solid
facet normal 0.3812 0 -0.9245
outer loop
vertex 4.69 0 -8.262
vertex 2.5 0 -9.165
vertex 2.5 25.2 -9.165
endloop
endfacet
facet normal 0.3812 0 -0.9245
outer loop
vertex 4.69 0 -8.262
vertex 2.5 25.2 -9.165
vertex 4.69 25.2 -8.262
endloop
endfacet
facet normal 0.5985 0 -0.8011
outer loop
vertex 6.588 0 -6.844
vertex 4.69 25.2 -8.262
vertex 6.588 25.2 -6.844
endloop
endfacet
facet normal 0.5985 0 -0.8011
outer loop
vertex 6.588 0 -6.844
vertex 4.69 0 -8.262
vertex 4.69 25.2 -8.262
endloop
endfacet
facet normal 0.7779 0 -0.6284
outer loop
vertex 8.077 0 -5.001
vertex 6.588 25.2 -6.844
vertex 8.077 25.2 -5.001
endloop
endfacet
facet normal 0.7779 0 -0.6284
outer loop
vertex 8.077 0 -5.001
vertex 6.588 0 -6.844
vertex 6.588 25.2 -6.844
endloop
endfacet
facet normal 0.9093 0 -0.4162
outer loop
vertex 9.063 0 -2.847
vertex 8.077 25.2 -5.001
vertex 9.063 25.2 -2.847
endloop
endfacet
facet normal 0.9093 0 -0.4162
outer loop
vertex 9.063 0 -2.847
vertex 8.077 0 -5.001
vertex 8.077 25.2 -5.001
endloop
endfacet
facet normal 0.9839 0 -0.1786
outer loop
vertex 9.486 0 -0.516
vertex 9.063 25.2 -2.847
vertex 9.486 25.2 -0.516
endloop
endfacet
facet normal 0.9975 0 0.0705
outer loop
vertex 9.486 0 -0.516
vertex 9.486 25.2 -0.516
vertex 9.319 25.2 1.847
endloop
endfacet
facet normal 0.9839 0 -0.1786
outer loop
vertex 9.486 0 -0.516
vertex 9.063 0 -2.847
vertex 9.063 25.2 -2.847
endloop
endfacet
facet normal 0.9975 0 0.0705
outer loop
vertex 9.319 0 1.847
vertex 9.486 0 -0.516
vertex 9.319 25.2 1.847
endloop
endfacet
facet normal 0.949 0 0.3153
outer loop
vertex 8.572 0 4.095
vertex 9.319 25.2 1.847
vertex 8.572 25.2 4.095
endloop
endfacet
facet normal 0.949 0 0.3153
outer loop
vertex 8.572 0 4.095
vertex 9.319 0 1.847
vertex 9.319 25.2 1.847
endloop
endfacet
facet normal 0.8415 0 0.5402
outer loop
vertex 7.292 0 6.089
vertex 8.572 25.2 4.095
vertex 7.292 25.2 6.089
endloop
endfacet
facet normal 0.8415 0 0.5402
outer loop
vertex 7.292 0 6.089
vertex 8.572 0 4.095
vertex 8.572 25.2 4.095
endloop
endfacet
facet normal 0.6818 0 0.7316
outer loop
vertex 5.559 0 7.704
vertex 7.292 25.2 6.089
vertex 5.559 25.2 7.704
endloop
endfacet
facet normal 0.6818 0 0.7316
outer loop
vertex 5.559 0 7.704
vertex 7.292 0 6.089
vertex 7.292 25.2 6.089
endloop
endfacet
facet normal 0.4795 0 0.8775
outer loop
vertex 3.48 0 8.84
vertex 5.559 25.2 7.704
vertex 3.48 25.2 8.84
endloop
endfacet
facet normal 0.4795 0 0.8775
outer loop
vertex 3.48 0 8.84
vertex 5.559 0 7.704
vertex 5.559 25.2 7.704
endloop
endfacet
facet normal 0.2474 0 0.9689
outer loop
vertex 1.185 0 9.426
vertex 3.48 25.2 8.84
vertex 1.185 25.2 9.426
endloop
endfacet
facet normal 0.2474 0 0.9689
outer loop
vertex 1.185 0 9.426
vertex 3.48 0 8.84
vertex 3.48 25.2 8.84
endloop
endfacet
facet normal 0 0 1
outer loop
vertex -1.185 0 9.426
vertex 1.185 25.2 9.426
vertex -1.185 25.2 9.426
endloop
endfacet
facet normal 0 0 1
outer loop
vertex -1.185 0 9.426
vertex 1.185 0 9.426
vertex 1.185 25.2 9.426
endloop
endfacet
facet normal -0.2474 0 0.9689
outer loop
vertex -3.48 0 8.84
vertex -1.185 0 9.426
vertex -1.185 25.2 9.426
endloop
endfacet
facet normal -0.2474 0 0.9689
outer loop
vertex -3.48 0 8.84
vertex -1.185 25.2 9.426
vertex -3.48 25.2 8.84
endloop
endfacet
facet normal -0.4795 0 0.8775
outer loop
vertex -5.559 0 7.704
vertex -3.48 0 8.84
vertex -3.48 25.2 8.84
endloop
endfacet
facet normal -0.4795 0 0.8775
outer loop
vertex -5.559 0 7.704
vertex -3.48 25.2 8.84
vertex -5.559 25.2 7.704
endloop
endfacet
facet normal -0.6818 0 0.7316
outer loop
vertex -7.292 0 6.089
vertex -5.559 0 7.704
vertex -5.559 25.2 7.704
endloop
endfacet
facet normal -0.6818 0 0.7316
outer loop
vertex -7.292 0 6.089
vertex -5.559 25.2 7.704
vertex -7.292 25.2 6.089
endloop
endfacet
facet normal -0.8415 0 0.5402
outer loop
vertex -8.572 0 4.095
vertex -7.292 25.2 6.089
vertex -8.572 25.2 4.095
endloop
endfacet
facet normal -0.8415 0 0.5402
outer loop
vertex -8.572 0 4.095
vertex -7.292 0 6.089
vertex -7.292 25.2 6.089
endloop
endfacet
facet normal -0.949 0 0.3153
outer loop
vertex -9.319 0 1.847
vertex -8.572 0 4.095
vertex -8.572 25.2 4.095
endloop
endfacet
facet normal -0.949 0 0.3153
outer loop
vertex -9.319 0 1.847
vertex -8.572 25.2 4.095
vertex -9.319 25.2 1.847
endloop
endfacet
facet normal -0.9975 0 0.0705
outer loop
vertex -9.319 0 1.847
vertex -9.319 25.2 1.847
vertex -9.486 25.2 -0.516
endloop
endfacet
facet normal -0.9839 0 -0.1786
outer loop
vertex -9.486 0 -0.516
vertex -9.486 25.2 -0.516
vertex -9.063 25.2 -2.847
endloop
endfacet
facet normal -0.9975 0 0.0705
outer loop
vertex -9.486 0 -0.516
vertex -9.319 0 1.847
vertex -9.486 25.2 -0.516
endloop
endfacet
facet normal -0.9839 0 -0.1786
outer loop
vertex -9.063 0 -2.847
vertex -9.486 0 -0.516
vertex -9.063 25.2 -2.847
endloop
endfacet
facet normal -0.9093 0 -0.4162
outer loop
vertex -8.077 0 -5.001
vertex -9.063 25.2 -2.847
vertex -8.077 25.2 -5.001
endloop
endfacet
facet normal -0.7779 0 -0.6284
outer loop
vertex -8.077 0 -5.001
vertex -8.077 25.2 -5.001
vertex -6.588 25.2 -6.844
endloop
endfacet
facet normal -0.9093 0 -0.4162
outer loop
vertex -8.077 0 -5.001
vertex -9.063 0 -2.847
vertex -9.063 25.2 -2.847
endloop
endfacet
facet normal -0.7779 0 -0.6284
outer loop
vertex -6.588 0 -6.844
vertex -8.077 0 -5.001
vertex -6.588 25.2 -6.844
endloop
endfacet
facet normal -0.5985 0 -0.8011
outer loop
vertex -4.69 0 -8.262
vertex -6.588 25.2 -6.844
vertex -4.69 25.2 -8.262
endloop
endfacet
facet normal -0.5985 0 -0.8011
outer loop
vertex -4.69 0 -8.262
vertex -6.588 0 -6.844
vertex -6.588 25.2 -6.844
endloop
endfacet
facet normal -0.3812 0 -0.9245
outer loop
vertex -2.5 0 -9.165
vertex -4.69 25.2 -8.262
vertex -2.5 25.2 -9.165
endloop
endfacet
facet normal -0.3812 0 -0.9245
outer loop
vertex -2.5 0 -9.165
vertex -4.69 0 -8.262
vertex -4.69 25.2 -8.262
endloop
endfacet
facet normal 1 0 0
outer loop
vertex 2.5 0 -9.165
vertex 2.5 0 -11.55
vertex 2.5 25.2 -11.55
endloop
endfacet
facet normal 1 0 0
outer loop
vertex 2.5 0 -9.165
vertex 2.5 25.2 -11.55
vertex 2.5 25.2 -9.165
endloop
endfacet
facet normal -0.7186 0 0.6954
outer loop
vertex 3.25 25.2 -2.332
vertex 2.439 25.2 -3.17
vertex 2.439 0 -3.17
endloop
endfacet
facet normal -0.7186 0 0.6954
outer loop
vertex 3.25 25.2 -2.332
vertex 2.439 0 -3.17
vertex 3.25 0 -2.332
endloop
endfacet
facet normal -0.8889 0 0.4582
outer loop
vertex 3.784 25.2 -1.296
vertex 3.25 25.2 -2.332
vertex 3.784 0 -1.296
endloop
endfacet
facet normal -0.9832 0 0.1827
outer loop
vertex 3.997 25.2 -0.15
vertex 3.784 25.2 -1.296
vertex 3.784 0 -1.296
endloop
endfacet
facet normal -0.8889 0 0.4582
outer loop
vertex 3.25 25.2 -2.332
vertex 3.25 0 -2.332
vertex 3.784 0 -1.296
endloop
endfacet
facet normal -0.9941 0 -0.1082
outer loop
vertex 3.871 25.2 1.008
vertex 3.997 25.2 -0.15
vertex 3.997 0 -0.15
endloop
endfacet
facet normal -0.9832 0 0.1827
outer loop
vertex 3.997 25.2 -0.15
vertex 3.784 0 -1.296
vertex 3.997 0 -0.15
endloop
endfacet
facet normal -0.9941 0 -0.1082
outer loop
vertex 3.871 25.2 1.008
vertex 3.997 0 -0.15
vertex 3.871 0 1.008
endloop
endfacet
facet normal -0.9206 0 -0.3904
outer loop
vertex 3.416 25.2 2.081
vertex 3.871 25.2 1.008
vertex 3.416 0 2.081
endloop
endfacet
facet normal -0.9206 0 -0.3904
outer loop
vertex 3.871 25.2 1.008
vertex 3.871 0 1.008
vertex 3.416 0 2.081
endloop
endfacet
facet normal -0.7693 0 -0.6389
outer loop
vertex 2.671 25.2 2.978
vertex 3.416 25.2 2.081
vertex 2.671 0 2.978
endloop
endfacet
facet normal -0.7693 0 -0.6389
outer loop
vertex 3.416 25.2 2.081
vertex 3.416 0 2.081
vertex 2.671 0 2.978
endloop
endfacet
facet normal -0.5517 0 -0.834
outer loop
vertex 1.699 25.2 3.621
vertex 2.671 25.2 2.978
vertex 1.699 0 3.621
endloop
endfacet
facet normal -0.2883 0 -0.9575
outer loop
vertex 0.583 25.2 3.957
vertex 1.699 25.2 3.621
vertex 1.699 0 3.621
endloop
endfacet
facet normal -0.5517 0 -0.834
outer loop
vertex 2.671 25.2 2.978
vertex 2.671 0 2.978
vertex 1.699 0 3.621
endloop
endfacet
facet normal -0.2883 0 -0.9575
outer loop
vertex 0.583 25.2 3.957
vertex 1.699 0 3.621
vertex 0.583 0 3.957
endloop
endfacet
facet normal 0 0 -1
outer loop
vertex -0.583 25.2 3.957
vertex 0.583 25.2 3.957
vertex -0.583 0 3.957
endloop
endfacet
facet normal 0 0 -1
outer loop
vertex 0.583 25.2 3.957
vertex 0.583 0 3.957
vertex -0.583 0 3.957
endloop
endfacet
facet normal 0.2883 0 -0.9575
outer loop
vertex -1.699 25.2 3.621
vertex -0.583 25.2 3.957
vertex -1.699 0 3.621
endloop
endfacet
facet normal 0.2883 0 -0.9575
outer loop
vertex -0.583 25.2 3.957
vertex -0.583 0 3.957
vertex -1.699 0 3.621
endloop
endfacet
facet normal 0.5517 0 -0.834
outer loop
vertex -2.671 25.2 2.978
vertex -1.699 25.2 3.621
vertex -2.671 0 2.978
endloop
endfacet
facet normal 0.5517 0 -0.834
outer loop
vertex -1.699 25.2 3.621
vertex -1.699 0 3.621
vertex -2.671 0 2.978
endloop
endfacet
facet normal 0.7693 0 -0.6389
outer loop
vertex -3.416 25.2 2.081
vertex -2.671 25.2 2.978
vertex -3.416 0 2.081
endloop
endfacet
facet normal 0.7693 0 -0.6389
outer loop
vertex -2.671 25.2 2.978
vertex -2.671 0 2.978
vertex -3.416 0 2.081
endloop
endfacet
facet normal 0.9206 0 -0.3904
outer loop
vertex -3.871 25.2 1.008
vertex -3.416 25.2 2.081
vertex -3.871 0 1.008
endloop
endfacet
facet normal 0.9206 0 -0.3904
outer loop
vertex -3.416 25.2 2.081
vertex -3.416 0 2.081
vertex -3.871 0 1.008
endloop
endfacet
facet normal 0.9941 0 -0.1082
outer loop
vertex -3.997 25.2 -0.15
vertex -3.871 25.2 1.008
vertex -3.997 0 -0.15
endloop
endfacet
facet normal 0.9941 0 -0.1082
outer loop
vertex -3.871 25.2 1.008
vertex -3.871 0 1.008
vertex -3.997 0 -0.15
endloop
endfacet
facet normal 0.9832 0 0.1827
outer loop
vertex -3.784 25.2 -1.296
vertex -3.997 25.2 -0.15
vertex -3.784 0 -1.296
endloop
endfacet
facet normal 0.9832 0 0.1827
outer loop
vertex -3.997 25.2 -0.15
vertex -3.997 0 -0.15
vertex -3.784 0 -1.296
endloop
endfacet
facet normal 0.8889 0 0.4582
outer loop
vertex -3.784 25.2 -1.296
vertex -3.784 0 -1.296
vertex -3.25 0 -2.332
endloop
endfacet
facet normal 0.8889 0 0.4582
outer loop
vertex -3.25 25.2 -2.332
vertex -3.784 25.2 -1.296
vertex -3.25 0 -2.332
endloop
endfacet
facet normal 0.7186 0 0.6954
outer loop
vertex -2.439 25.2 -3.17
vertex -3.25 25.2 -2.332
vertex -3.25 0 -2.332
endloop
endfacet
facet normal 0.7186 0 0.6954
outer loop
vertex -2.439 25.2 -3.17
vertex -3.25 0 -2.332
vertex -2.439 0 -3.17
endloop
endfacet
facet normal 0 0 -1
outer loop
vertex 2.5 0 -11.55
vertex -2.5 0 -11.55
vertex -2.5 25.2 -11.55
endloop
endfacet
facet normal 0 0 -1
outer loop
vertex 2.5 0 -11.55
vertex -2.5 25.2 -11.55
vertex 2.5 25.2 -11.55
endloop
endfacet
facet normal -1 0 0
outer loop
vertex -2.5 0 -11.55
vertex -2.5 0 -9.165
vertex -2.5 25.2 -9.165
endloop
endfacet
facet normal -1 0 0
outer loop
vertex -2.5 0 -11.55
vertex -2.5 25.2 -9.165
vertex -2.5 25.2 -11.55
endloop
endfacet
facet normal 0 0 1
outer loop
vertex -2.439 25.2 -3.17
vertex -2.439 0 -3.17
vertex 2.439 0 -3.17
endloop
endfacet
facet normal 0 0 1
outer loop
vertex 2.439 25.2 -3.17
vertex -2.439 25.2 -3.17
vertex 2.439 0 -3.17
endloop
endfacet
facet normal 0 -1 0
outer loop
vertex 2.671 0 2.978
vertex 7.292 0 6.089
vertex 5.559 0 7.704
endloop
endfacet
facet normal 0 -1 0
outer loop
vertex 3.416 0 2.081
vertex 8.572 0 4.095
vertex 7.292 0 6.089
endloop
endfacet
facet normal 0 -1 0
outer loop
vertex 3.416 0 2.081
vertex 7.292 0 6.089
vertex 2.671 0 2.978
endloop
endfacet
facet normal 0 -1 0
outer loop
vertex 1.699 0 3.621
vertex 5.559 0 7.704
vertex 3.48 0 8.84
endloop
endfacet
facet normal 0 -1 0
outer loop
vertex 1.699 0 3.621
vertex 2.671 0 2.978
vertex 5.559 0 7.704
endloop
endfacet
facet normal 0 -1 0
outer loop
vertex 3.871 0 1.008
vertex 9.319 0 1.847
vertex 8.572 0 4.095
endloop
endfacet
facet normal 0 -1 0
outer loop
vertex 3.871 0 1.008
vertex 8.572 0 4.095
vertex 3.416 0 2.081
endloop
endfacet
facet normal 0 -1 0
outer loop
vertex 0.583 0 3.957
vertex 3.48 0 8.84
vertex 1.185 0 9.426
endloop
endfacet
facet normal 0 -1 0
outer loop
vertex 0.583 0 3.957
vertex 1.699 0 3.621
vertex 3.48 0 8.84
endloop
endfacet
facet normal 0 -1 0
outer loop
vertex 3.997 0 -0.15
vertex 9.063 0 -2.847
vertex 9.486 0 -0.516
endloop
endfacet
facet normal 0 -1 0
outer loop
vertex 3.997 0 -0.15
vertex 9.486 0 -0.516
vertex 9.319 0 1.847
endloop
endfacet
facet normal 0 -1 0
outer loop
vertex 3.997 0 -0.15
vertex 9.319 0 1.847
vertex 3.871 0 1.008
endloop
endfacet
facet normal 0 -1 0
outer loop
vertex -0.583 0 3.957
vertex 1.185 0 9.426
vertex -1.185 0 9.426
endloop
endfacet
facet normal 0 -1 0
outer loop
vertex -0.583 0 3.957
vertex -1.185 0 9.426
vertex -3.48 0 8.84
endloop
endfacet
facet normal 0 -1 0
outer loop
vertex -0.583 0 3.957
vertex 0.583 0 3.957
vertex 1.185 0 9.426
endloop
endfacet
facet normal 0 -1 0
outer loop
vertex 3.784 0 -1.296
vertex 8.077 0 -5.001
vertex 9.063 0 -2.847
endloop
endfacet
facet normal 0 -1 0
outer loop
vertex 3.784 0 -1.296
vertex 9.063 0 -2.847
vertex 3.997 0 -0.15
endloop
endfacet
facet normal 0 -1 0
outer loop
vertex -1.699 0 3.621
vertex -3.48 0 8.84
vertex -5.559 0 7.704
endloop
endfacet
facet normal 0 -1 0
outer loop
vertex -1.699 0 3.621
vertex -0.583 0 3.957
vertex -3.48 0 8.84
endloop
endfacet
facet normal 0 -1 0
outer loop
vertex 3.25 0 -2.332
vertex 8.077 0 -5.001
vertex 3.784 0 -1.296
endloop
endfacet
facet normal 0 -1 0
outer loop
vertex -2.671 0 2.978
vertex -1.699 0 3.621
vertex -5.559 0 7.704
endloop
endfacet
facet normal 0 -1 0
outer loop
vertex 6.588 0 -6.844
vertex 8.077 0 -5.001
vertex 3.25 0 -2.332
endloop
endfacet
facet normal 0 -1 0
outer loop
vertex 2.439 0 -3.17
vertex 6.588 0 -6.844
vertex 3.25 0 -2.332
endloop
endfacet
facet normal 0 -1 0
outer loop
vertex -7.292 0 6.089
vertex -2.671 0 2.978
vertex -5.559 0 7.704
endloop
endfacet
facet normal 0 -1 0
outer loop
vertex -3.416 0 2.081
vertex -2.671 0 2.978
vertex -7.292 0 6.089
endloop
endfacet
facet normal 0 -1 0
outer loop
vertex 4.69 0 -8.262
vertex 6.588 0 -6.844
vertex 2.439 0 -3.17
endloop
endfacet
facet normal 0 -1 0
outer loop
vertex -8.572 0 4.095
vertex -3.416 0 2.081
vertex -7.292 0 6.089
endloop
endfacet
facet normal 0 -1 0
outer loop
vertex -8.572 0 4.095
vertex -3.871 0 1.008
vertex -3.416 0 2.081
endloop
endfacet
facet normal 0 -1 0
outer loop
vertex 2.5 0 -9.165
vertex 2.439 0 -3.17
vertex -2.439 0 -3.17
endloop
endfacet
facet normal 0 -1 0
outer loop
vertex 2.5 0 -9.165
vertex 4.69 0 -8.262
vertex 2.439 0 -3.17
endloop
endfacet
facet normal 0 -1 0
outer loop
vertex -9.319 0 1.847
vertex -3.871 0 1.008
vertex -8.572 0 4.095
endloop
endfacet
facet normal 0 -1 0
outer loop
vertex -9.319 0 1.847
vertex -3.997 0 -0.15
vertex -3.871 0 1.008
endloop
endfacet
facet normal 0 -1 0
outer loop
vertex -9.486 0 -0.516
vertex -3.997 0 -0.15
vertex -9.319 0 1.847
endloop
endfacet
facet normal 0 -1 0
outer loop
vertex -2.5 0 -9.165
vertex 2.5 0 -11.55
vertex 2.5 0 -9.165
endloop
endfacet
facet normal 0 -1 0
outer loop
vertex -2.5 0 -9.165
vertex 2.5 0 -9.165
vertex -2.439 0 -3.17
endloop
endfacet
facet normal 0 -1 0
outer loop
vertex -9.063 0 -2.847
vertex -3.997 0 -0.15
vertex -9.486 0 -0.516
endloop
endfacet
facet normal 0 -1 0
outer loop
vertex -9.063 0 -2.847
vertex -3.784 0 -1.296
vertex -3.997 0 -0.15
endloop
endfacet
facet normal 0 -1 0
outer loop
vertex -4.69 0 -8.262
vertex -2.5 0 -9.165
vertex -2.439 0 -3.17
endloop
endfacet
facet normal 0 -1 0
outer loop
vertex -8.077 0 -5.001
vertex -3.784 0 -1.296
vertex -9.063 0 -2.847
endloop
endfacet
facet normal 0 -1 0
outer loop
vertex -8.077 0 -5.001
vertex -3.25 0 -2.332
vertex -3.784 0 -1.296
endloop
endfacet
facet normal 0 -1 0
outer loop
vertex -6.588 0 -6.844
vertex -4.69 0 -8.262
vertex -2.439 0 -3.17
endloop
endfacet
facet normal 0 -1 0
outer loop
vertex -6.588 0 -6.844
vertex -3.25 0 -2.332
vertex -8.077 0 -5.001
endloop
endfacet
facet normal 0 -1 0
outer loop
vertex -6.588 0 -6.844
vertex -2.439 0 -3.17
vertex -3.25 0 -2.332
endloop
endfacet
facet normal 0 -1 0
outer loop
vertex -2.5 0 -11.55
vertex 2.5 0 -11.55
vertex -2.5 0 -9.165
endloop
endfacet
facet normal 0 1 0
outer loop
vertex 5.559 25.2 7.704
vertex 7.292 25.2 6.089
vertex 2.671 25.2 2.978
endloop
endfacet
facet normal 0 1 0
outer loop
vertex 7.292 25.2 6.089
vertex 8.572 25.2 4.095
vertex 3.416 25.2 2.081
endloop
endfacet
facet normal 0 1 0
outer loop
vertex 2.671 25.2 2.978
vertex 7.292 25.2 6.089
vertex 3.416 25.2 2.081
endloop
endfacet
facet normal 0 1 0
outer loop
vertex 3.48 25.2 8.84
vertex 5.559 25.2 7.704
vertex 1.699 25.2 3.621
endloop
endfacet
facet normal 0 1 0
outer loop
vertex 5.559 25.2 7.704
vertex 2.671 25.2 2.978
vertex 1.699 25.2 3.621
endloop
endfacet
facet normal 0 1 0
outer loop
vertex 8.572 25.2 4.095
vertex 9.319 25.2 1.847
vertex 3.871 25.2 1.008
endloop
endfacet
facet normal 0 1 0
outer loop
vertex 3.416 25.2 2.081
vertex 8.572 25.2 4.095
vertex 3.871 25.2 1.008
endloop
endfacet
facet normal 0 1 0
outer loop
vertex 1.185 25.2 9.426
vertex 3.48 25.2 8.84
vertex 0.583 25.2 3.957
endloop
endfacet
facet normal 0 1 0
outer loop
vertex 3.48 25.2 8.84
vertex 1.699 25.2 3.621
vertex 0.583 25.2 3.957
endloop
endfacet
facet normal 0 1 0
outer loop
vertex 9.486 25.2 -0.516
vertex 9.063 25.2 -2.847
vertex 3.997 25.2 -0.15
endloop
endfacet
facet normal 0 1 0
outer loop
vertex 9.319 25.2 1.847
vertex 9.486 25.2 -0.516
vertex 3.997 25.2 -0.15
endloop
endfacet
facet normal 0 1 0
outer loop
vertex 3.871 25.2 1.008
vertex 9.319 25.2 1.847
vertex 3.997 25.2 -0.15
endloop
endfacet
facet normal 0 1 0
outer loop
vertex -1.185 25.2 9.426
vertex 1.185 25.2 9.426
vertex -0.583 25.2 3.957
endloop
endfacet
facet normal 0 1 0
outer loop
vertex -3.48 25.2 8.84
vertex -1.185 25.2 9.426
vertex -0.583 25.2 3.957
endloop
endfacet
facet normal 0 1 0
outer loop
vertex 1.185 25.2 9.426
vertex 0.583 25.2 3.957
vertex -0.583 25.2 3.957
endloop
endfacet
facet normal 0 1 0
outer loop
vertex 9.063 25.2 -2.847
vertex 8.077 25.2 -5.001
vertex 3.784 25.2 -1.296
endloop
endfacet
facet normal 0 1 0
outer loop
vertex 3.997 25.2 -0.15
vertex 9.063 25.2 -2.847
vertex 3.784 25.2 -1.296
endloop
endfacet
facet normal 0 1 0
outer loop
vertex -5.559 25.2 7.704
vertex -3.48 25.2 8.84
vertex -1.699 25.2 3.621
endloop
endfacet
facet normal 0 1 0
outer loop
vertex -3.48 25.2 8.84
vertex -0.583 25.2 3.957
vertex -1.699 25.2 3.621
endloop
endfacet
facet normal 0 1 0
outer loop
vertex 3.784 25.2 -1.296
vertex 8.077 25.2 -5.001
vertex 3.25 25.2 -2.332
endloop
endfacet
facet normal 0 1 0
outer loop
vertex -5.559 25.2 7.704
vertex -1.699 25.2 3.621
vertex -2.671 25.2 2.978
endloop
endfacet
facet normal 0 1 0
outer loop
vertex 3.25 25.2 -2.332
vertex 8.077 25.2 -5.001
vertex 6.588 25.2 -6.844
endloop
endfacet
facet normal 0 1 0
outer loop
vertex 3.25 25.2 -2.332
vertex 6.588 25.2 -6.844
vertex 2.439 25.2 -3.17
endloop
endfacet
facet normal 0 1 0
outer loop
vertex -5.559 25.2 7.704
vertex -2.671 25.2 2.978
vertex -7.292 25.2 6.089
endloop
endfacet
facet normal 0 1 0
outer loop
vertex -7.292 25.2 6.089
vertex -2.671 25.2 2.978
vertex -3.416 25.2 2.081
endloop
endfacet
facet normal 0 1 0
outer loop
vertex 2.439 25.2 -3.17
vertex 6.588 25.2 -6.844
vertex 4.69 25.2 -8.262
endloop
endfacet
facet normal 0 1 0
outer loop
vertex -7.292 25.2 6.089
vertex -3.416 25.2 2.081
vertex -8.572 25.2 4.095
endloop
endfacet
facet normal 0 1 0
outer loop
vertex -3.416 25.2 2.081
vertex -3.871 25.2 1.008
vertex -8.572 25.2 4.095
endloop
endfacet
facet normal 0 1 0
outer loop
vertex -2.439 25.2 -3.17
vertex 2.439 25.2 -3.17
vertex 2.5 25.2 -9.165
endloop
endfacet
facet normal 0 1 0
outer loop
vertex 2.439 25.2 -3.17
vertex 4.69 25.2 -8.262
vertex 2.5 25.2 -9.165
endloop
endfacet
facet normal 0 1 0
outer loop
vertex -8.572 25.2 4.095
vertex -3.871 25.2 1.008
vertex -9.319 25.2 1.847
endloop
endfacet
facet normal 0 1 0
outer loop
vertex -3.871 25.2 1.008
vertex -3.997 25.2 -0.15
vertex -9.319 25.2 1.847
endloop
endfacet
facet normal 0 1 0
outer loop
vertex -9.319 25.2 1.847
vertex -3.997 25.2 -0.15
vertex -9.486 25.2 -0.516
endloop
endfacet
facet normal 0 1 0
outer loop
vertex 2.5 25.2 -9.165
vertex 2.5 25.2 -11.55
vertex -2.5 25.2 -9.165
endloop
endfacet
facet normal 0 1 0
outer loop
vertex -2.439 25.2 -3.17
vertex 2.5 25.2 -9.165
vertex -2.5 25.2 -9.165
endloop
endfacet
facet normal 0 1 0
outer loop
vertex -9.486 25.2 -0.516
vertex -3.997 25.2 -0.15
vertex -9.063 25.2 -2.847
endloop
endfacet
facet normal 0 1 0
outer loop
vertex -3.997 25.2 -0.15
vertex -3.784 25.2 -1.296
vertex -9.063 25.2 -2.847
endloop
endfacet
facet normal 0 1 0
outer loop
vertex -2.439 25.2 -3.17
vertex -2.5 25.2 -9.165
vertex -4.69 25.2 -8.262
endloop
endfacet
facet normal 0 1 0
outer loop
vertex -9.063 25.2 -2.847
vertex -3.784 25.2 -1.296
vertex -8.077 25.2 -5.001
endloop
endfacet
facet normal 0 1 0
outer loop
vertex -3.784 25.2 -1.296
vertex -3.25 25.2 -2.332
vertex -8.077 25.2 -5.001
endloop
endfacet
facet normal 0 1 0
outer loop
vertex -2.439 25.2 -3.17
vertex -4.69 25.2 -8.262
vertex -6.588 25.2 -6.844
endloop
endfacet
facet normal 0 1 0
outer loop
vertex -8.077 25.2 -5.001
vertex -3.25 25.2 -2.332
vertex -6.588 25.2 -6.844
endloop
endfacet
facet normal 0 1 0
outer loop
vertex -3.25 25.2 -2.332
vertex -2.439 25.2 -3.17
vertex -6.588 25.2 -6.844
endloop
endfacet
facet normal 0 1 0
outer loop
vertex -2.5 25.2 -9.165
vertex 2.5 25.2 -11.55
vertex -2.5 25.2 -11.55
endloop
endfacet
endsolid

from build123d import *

# Parameters (mm, degrees)
SALIENTE_EXTRUIR1_DEPTH = 25.2


with BuildPart() as part:
    # Croquis1 → Saliente-Extruir1 (new body)
    with BuildSketch(Plane(origin=(0, 0, 0), x_dir=(1, 0, 0), z_dir=(0, 1, 0))):
        with BuildLine():
            Line((-2.5, 11.55), (2.5, 11.55))
            Line((2.5, 11.55), (2.5, 9.16515139))
            ThreePointArc((2.5, 9.16515139), (0, -9.5), (-2.5, 9.16515139))
            Line((-2.5, 9.16515139), (-2.5, 11.55))
        make_face()
        with BuildLine():
            Line((-2.439487651, 3.17), (2.439487651, 3.17))
            ThreePointArc((2.439487651, 3.17), (0, -4), (-2.439487651, 3.17))
        make_face(mode=Mode.SUBTRACT)
    extrude(amount=SALIENTE_EXTRUIR1_DEPTH)


solid = part.part
